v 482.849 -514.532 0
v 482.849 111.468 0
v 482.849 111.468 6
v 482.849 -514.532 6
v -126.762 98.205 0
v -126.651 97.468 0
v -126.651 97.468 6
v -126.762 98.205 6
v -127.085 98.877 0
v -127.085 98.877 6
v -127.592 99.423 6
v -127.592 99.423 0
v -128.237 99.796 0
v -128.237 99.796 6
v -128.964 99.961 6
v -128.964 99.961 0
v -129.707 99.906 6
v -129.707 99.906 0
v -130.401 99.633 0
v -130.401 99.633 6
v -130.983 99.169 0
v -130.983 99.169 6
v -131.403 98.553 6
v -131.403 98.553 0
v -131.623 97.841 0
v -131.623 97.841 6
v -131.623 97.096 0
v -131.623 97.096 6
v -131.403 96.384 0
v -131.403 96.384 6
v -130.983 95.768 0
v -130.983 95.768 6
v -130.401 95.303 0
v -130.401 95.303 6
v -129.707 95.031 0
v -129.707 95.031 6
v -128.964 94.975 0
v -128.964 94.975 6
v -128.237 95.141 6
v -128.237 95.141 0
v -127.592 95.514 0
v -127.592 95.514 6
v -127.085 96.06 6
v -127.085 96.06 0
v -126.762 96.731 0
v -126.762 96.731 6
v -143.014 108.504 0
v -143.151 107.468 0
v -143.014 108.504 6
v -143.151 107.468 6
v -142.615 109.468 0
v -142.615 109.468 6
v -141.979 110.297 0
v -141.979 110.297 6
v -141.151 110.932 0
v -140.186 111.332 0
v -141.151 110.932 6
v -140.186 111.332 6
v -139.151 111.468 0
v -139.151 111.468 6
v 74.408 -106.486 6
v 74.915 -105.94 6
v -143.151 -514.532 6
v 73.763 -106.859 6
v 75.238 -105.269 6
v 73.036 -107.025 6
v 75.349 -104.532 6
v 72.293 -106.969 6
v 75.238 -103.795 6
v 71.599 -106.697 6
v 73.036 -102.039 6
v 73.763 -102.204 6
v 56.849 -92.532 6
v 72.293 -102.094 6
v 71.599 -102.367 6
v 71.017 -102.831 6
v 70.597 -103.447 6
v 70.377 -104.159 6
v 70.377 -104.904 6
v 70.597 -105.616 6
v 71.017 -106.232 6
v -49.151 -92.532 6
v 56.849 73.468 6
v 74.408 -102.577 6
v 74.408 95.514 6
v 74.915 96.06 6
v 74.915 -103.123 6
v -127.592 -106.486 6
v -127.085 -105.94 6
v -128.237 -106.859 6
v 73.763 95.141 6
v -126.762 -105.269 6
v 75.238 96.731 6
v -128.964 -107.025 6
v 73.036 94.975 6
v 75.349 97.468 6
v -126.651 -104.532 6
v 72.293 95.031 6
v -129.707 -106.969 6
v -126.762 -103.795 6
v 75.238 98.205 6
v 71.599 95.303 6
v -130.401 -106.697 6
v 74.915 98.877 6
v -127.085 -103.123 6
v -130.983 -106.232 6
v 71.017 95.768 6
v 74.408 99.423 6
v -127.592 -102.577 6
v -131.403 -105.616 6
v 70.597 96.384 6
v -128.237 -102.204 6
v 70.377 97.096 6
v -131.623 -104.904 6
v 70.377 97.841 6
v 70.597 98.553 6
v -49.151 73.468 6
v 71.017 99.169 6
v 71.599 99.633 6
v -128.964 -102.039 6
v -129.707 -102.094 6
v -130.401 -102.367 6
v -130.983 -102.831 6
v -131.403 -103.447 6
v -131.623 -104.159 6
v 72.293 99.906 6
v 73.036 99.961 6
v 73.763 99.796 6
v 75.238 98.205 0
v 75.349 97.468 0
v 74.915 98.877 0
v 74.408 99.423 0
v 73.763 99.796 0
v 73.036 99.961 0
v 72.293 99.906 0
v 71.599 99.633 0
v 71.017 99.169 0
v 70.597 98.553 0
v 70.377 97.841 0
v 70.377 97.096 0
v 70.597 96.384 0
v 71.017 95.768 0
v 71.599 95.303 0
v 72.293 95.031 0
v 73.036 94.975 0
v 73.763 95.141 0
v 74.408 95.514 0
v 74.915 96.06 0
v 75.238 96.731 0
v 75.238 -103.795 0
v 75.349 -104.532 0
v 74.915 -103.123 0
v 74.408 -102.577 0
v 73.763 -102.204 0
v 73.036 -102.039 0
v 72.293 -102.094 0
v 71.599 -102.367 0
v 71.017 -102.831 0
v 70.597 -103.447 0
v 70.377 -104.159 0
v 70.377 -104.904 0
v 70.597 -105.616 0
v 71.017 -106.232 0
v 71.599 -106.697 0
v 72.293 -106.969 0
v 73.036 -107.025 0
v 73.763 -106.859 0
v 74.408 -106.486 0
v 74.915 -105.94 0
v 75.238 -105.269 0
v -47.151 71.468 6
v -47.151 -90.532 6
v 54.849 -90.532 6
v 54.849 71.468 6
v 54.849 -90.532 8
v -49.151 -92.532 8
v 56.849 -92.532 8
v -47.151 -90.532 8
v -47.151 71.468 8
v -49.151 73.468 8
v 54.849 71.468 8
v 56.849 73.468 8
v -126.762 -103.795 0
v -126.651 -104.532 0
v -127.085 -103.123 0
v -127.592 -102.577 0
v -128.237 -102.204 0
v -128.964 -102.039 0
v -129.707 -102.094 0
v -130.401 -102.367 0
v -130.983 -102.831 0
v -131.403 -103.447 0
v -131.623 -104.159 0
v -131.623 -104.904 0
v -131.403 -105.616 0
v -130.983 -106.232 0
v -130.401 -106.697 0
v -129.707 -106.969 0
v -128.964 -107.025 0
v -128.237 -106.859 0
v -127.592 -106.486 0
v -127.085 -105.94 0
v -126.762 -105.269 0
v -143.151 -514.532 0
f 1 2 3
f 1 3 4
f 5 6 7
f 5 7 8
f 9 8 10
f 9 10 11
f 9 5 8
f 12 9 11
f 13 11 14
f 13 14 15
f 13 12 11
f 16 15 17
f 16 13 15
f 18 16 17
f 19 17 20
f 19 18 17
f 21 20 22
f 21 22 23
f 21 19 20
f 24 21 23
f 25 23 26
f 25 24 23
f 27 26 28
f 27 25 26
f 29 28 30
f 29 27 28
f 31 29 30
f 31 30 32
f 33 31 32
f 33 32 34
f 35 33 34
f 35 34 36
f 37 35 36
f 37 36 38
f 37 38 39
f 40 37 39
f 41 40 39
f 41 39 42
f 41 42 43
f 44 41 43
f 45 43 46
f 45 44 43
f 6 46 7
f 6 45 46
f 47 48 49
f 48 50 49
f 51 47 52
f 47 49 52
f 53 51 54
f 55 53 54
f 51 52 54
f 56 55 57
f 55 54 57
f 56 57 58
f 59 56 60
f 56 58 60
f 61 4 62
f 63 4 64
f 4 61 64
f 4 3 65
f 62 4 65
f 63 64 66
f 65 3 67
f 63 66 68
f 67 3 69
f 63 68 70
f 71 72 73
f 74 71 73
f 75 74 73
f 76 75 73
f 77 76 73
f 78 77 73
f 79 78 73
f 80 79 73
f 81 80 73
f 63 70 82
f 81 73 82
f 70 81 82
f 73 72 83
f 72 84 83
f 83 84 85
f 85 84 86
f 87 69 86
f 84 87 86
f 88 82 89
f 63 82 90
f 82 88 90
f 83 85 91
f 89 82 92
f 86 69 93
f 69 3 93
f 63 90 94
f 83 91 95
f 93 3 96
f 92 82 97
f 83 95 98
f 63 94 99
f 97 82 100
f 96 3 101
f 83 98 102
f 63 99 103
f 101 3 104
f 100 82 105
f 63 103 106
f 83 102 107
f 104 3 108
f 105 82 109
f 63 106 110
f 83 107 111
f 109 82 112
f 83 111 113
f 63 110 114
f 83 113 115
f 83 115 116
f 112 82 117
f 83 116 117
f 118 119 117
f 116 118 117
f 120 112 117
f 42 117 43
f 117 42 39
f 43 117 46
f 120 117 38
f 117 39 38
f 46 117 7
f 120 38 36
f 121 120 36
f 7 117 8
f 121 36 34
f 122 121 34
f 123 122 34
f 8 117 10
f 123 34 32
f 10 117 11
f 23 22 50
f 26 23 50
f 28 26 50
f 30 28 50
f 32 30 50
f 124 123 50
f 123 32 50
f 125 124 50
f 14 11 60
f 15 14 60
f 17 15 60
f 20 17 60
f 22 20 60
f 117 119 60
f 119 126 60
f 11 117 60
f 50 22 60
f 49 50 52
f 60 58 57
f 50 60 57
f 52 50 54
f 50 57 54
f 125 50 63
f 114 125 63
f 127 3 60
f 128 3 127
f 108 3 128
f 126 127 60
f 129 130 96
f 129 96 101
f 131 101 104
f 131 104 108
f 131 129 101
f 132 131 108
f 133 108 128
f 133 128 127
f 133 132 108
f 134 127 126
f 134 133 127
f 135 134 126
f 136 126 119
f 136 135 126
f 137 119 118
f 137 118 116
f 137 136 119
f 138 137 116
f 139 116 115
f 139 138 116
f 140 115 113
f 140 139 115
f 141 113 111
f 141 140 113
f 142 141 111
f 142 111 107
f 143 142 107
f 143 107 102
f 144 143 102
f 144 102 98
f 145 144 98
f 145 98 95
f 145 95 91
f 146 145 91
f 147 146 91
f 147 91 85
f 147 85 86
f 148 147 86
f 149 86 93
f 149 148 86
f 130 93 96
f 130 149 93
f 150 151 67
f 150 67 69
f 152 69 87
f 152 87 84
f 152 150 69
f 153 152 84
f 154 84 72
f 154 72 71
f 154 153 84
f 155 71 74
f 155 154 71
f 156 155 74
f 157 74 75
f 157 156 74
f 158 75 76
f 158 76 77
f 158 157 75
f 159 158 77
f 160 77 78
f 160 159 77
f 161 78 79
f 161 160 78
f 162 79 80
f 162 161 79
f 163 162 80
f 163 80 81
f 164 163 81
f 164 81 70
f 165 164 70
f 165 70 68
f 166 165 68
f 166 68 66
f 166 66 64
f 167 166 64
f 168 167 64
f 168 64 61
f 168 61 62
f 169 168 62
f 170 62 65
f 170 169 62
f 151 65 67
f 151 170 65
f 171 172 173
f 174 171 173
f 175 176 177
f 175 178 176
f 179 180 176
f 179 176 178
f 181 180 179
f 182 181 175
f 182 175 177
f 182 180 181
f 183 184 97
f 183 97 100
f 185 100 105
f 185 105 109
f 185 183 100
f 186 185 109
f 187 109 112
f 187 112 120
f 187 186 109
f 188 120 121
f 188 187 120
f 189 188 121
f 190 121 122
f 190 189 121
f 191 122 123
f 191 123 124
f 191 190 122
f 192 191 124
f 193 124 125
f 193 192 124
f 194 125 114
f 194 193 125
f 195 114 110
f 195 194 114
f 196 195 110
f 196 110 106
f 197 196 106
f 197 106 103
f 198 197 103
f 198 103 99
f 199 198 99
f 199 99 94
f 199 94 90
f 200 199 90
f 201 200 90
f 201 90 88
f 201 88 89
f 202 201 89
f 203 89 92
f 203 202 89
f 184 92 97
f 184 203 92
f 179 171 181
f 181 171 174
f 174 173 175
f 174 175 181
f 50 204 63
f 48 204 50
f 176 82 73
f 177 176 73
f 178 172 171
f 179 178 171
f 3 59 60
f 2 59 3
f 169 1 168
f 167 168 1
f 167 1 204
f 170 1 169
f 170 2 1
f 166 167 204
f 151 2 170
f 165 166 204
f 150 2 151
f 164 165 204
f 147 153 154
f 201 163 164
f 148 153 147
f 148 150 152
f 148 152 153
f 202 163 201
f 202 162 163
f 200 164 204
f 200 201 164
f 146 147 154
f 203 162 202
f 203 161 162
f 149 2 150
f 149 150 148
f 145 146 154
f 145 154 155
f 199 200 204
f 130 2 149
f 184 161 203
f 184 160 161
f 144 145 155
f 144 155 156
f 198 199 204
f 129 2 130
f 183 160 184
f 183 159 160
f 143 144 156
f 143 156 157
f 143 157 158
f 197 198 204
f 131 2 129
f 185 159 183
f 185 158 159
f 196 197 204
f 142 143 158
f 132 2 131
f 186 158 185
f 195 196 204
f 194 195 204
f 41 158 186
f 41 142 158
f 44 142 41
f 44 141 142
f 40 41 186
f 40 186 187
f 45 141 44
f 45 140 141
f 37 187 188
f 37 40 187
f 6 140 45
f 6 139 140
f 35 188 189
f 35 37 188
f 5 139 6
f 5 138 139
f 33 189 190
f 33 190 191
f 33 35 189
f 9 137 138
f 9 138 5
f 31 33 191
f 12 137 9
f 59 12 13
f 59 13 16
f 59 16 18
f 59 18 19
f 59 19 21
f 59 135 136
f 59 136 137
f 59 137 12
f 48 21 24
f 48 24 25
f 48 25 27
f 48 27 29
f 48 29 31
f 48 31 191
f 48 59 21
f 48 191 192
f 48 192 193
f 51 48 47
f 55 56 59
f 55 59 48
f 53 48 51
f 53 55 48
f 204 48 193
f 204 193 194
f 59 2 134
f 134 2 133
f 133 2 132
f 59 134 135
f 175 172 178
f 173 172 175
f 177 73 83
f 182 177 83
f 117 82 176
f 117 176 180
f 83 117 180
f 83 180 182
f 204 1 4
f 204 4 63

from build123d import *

# Parameters (mm, degrees)
ESQUISSE1_W        = 230
ESQUISSE1_H        = 230
ESQUISSE1_R        = 2.5
BOSS_EXTRU_1_DEPTH = 6
CONG_1_R           = 4
ESQUISSE2_W        = 106
ESQUISSE2_H        = 166
ESQUISSE2_W_2      = 102
ESQUISSE2_H_2      = 162
BOSS_EXTRU_2_DEPTH = 2
BOSS_EXTRU_3_DEPTH = 6


with BuildPart() as part:
    # Esquisse1 → Boss.-Extru.1 (new body)
    with BuildSketch(Plane.XY):
        with Locations((-28.150579015, -3.53164557)):
            Rectangle(ESQUISSE1_W, ESQUISSE1_H)
        with Locations((-129.150579015, 97.46835443)):
            Circle(ESQUISSE1_R, mode=Mode.SUBTRACT)
        with Locations((72.849420985, 97.46835443)):
            Circle(ESQUISSE1_R, mode=Mode.SUBTRACT)
        with Locations((72.849420985, -104.53164557)):
            Circle(ESQUISSE1_R, mode=Mode.SUBTRACT)
        with Locations((-129.150579015, -104.53164557)):
            Circle(ESQUISSE1_R, mode=Mode.SUBTRACT)
    extrude(amount=BOSS_EXTRU_1_DEPTH)

    # Congé1
    cong_1_edges = [part.edges().sort_by_distance(p)[0] for p in [
        (-143.150579015, 111.46835443, 3),
        (86.849420985, 111.46835443, 3),
        (86.849420985, -118.53164557, 3),
        (-143.150579015, -118.53164557, 3),
    ]]
    fillet(cong_1_edges, radius=CONG_1_R)

    # Esquisse2 → Boss.-Extru.2 (add)
    with BuildSketch(Plane.XY.offset(6)):
        with Locations((3.849420985, -9.53164557)):
            Rectangle(ESQUISSE2_W, ESQUISSE2_H)
        with Locations((3.849420985, -9.53164557)):
            Rectangle(ESQUISSE2_W_2, ESQUISSE2_H_2, mode=Mode.SUBTRACT)
    extrude(amount=BOSS_EXTRU_2_DEPTH)

    # Esquisse3 → Boss.-Extru.3 (add)
    with BuildSketch(Plane(origin=(0, 0, 0), x_dir=(-1, 0, 0), z_dir=(0, 0, -1))):
        Polygon((-82.849420985, 111.46835443), (-482.849420985, 111.46835443), (-482.849420985, -514.53164557), (143.150579015, -514.53164557), (143.150579015, -114.53164557), (-82.849420985, -114.53164557), align=None)
    extrude(amount=-BOSS_EXTRU_3_DEPTH)


solid = part.part
